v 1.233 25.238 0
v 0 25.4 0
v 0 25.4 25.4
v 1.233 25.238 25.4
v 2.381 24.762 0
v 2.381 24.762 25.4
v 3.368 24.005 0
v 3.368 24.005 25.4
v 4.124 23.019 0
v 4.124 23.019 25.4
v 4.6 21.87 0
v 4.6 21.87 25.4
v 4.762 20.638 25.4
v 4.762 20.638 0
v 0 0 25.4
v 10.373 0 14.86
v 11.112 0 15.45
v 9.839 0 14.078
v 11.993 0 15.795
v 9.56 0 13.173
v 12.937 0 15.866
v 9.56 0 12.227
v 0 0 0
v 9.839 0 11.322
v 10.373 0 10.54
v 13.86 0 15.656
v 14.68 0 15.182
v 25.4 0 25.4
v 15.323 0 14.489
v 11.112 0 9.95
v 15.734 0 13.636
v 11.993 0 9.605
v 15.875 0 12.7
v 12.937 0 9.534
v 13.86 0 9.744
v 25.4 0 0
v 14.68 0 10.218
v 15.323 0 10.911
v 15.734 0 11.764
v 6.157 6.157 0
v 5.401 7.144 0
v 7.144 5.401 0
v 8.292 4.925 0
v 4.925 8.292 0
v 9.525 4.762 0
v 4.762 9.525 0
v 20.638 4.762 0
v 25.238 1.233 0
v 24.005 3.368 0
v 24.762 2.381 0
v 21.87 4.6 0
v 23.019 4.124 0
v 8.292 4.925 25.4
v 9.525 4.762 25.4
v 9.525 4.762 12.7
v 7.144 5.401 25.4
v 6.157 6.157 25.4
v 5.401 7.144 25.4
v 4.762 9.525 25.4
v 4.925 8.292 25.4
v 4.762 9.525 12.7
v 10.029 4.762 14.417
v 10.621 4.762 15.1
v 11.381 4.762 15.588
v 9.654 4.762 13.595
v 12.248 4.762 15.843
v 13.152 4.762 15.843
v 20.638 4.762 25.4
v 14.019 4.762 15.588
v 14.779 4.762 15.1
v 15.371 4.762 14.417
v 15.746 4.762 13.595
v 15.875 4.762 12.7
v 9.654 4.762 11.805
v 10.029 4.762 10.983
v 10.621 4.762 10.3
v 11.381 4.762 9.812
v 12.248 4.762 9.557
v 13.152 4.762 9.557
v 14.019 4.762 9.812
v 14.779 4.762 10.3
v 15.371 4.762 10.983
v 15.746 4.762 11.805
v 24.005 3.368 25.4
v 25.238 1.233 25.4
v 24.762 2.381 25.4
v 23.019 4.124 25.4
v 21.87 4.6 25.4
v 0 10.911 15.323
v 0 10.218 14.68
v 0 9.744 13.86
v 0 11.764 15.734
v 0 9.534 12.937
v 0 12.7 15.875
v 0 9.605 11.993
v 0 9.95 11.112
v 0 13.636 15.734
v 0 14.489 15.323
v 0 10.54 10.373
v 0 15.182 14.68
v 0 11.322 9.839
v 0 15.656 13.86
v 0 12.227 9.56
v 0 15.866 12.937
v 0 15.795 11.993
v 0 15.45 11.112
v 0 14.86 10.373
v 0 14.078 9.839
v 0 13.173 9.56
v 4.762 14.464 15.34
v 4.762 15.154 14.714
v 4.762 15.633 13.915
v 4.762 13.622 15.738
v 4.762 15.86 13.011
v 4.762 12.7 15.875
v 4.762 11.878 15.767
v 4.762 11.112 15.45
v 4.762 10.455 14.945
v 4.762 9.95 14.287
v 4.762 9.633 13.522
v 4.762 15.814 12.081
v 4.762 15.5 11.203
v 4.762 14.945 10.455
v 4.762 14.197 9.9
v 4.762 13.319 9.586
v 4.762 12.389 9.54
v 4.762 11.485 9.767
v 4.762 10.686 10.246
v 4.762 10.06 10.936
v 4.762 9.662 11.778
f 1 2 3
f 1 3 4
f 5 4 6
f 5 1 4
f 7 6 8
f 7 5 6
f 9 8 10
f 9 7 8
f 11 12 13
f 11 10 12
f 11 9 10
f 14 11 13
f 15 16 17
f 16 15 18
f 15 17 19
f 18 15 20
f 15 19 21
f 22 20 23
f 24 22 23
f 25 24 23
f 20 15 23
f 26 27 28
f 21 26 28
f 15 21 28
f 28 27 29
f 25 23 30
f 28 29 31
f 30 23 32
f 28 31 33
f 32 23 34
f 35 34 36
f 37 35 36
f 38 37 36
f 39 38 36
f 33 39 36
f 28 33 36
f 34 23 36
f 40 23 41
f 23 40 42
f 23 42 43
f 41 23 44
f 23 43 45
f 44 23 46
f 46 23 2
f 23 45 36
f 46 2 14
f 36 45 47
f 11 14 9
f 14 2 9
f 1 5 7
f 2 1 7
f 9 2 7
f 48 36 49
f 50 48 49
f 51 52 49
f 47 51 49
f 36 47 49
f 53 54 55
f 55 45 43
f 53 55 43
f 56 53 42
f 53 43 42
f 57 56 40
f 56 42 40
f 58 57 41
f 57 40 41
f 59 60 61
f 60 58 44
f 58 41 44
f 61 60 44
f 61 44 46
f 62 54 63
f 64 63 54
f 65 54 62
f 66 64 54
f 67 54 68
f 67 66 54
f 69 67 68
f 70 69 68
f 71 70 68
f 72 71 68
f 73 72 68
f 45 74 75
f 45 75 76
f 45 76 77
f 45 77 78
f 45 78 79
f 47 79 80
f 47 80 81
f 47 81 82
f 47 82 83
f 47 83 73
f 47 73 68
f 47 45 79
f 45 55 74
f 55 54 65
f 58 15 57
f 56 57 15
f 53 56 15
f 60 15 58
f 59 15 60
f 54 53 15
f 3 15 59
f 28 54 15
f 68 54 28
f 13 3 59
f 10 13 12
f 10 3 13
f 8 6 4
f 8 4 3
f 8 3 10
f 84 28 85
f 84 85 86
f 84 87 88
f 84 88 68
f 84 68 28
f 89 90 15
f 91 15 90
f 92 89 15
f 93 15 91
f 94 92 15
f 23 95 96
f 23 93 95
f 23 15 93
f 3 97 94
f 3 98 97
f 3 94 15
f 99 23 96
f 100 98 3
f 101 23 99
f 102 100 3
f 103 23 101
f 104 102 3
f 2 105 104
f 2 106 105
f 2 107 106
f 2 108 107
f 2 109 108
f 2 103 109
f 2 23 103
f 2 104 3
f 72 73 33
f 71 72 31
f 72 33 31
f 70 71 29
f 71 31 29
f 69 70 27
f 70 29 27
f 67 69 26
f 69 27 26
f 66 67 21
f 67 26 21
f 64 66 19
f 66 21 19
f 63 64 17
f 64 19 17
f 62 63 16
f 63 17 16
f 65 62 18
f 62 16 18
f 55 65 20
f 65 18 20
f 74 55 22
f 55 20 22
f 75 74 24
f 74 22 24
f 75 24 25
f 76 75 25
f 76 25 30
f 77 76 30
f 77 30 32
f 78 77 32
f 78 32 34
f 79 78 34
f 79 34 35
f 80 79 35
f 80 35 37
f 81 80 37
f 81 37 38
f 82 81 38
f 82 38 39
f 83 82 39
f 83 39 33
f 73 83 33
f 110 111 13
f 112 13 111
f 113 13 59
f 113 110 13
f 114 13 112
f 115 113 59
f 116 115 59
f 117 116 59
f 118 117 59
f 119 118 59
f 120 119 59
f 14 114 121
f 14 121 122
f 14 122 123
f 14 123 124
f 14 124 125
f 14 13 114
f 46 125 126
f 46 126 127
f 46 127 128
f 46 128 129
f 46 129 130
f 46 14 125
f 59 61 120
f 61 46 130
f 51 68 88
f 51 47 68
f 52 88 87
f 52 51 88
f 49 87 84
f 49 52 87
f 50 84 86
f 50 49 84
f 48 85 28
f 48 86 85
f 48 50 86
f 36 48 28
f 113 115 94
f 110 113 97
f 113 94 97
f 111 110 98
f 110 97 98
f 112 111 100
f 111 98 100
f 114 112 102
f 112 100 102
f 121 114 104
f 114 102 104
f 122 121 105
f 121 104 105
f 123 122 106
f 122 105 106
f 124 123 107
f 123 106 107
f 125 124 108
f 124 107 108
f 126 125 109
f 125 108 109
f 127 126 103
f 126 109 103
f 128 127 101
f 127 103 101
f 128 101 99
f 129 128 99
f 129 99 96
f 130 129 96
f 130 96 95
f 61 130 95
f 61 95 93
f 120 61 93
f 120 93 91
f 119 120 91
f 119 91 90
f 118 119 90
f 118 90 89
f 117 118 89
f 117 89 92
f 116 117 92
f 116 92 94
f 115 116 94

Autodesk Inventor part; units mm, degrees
ref_plane "YZ Plane" through (0, 0, 0) normal (1, 0, 0) x (0, 1, 0)
ref_plane "XZ Plane" through (0, 0, 0) normal (0, 1, 0) x (-1, 0, 0)
ref_plane "XY Plane" through (0, 0, 0) normal (0, 0, 1) x (1, 0, 0)
sketch "Sketch1" plane through (0, 0, 0) normal (0, 0, 1) x (1, 0, 0)
  line L0 (0, 0) -> (0, 25.4)
  line L1 (0, 0) -> (25.4, 0)
  line L2 (4.7625, 20.6375) -> (4.7625, 9.525)
  line L3 (9.525, 4.7625) -> (20.6375, 4.7625)
  arc A0 (4.7625, 20.6375) -> (0, 25.4) centre (0, 20.6375) ccw
  arc A1 (25.4, 0) -> (20.6375, 4.7625) centre (20.6375, 0) ccw
  arc A2 (4.7625, 9.525) -> (9.525, 4.7625) centre (9.525, 9.525) ccw
  dimension "d0" = 25.4
  dimension "d1" = 25.4
  dimension "d2" = 4.7625
  dimension "d3" = 4.7625
extrude "Extrusion1" add sketch "Sketch1" along normal blind 25.4
sketch "Sketch2" plane through (0, 0, 0) normal (0, -1, 0) x (1, 0, 0)
  line L0 (25.4, 25.4) -> (0, 25.4) projected
  line L1 (25.4, 0) -> (25.4, 25.4) projected
  circle A0 centre (12.7, 12.7) radius 3.175
  dimension "d6" = 6.35
  dimension "d7" = 12.7
  dimension "d8" = 12.7
extrude "Extrusion2" cut sketch "Sketch2" against normal blind 25.4
sketch "Sketch3" plane through (0, 0, 0) normal (-1, 0, 0) x (0, 0, 1)
  circle A0 centre (12.7, 12.7) radius 3.175
  dimension "d11" = 6.35
extrude "Extrusion3" cut sketch "Sketch3" against normal blind 25.4
equation "\"d3\" = d2"
properties part number "small L bracket"
